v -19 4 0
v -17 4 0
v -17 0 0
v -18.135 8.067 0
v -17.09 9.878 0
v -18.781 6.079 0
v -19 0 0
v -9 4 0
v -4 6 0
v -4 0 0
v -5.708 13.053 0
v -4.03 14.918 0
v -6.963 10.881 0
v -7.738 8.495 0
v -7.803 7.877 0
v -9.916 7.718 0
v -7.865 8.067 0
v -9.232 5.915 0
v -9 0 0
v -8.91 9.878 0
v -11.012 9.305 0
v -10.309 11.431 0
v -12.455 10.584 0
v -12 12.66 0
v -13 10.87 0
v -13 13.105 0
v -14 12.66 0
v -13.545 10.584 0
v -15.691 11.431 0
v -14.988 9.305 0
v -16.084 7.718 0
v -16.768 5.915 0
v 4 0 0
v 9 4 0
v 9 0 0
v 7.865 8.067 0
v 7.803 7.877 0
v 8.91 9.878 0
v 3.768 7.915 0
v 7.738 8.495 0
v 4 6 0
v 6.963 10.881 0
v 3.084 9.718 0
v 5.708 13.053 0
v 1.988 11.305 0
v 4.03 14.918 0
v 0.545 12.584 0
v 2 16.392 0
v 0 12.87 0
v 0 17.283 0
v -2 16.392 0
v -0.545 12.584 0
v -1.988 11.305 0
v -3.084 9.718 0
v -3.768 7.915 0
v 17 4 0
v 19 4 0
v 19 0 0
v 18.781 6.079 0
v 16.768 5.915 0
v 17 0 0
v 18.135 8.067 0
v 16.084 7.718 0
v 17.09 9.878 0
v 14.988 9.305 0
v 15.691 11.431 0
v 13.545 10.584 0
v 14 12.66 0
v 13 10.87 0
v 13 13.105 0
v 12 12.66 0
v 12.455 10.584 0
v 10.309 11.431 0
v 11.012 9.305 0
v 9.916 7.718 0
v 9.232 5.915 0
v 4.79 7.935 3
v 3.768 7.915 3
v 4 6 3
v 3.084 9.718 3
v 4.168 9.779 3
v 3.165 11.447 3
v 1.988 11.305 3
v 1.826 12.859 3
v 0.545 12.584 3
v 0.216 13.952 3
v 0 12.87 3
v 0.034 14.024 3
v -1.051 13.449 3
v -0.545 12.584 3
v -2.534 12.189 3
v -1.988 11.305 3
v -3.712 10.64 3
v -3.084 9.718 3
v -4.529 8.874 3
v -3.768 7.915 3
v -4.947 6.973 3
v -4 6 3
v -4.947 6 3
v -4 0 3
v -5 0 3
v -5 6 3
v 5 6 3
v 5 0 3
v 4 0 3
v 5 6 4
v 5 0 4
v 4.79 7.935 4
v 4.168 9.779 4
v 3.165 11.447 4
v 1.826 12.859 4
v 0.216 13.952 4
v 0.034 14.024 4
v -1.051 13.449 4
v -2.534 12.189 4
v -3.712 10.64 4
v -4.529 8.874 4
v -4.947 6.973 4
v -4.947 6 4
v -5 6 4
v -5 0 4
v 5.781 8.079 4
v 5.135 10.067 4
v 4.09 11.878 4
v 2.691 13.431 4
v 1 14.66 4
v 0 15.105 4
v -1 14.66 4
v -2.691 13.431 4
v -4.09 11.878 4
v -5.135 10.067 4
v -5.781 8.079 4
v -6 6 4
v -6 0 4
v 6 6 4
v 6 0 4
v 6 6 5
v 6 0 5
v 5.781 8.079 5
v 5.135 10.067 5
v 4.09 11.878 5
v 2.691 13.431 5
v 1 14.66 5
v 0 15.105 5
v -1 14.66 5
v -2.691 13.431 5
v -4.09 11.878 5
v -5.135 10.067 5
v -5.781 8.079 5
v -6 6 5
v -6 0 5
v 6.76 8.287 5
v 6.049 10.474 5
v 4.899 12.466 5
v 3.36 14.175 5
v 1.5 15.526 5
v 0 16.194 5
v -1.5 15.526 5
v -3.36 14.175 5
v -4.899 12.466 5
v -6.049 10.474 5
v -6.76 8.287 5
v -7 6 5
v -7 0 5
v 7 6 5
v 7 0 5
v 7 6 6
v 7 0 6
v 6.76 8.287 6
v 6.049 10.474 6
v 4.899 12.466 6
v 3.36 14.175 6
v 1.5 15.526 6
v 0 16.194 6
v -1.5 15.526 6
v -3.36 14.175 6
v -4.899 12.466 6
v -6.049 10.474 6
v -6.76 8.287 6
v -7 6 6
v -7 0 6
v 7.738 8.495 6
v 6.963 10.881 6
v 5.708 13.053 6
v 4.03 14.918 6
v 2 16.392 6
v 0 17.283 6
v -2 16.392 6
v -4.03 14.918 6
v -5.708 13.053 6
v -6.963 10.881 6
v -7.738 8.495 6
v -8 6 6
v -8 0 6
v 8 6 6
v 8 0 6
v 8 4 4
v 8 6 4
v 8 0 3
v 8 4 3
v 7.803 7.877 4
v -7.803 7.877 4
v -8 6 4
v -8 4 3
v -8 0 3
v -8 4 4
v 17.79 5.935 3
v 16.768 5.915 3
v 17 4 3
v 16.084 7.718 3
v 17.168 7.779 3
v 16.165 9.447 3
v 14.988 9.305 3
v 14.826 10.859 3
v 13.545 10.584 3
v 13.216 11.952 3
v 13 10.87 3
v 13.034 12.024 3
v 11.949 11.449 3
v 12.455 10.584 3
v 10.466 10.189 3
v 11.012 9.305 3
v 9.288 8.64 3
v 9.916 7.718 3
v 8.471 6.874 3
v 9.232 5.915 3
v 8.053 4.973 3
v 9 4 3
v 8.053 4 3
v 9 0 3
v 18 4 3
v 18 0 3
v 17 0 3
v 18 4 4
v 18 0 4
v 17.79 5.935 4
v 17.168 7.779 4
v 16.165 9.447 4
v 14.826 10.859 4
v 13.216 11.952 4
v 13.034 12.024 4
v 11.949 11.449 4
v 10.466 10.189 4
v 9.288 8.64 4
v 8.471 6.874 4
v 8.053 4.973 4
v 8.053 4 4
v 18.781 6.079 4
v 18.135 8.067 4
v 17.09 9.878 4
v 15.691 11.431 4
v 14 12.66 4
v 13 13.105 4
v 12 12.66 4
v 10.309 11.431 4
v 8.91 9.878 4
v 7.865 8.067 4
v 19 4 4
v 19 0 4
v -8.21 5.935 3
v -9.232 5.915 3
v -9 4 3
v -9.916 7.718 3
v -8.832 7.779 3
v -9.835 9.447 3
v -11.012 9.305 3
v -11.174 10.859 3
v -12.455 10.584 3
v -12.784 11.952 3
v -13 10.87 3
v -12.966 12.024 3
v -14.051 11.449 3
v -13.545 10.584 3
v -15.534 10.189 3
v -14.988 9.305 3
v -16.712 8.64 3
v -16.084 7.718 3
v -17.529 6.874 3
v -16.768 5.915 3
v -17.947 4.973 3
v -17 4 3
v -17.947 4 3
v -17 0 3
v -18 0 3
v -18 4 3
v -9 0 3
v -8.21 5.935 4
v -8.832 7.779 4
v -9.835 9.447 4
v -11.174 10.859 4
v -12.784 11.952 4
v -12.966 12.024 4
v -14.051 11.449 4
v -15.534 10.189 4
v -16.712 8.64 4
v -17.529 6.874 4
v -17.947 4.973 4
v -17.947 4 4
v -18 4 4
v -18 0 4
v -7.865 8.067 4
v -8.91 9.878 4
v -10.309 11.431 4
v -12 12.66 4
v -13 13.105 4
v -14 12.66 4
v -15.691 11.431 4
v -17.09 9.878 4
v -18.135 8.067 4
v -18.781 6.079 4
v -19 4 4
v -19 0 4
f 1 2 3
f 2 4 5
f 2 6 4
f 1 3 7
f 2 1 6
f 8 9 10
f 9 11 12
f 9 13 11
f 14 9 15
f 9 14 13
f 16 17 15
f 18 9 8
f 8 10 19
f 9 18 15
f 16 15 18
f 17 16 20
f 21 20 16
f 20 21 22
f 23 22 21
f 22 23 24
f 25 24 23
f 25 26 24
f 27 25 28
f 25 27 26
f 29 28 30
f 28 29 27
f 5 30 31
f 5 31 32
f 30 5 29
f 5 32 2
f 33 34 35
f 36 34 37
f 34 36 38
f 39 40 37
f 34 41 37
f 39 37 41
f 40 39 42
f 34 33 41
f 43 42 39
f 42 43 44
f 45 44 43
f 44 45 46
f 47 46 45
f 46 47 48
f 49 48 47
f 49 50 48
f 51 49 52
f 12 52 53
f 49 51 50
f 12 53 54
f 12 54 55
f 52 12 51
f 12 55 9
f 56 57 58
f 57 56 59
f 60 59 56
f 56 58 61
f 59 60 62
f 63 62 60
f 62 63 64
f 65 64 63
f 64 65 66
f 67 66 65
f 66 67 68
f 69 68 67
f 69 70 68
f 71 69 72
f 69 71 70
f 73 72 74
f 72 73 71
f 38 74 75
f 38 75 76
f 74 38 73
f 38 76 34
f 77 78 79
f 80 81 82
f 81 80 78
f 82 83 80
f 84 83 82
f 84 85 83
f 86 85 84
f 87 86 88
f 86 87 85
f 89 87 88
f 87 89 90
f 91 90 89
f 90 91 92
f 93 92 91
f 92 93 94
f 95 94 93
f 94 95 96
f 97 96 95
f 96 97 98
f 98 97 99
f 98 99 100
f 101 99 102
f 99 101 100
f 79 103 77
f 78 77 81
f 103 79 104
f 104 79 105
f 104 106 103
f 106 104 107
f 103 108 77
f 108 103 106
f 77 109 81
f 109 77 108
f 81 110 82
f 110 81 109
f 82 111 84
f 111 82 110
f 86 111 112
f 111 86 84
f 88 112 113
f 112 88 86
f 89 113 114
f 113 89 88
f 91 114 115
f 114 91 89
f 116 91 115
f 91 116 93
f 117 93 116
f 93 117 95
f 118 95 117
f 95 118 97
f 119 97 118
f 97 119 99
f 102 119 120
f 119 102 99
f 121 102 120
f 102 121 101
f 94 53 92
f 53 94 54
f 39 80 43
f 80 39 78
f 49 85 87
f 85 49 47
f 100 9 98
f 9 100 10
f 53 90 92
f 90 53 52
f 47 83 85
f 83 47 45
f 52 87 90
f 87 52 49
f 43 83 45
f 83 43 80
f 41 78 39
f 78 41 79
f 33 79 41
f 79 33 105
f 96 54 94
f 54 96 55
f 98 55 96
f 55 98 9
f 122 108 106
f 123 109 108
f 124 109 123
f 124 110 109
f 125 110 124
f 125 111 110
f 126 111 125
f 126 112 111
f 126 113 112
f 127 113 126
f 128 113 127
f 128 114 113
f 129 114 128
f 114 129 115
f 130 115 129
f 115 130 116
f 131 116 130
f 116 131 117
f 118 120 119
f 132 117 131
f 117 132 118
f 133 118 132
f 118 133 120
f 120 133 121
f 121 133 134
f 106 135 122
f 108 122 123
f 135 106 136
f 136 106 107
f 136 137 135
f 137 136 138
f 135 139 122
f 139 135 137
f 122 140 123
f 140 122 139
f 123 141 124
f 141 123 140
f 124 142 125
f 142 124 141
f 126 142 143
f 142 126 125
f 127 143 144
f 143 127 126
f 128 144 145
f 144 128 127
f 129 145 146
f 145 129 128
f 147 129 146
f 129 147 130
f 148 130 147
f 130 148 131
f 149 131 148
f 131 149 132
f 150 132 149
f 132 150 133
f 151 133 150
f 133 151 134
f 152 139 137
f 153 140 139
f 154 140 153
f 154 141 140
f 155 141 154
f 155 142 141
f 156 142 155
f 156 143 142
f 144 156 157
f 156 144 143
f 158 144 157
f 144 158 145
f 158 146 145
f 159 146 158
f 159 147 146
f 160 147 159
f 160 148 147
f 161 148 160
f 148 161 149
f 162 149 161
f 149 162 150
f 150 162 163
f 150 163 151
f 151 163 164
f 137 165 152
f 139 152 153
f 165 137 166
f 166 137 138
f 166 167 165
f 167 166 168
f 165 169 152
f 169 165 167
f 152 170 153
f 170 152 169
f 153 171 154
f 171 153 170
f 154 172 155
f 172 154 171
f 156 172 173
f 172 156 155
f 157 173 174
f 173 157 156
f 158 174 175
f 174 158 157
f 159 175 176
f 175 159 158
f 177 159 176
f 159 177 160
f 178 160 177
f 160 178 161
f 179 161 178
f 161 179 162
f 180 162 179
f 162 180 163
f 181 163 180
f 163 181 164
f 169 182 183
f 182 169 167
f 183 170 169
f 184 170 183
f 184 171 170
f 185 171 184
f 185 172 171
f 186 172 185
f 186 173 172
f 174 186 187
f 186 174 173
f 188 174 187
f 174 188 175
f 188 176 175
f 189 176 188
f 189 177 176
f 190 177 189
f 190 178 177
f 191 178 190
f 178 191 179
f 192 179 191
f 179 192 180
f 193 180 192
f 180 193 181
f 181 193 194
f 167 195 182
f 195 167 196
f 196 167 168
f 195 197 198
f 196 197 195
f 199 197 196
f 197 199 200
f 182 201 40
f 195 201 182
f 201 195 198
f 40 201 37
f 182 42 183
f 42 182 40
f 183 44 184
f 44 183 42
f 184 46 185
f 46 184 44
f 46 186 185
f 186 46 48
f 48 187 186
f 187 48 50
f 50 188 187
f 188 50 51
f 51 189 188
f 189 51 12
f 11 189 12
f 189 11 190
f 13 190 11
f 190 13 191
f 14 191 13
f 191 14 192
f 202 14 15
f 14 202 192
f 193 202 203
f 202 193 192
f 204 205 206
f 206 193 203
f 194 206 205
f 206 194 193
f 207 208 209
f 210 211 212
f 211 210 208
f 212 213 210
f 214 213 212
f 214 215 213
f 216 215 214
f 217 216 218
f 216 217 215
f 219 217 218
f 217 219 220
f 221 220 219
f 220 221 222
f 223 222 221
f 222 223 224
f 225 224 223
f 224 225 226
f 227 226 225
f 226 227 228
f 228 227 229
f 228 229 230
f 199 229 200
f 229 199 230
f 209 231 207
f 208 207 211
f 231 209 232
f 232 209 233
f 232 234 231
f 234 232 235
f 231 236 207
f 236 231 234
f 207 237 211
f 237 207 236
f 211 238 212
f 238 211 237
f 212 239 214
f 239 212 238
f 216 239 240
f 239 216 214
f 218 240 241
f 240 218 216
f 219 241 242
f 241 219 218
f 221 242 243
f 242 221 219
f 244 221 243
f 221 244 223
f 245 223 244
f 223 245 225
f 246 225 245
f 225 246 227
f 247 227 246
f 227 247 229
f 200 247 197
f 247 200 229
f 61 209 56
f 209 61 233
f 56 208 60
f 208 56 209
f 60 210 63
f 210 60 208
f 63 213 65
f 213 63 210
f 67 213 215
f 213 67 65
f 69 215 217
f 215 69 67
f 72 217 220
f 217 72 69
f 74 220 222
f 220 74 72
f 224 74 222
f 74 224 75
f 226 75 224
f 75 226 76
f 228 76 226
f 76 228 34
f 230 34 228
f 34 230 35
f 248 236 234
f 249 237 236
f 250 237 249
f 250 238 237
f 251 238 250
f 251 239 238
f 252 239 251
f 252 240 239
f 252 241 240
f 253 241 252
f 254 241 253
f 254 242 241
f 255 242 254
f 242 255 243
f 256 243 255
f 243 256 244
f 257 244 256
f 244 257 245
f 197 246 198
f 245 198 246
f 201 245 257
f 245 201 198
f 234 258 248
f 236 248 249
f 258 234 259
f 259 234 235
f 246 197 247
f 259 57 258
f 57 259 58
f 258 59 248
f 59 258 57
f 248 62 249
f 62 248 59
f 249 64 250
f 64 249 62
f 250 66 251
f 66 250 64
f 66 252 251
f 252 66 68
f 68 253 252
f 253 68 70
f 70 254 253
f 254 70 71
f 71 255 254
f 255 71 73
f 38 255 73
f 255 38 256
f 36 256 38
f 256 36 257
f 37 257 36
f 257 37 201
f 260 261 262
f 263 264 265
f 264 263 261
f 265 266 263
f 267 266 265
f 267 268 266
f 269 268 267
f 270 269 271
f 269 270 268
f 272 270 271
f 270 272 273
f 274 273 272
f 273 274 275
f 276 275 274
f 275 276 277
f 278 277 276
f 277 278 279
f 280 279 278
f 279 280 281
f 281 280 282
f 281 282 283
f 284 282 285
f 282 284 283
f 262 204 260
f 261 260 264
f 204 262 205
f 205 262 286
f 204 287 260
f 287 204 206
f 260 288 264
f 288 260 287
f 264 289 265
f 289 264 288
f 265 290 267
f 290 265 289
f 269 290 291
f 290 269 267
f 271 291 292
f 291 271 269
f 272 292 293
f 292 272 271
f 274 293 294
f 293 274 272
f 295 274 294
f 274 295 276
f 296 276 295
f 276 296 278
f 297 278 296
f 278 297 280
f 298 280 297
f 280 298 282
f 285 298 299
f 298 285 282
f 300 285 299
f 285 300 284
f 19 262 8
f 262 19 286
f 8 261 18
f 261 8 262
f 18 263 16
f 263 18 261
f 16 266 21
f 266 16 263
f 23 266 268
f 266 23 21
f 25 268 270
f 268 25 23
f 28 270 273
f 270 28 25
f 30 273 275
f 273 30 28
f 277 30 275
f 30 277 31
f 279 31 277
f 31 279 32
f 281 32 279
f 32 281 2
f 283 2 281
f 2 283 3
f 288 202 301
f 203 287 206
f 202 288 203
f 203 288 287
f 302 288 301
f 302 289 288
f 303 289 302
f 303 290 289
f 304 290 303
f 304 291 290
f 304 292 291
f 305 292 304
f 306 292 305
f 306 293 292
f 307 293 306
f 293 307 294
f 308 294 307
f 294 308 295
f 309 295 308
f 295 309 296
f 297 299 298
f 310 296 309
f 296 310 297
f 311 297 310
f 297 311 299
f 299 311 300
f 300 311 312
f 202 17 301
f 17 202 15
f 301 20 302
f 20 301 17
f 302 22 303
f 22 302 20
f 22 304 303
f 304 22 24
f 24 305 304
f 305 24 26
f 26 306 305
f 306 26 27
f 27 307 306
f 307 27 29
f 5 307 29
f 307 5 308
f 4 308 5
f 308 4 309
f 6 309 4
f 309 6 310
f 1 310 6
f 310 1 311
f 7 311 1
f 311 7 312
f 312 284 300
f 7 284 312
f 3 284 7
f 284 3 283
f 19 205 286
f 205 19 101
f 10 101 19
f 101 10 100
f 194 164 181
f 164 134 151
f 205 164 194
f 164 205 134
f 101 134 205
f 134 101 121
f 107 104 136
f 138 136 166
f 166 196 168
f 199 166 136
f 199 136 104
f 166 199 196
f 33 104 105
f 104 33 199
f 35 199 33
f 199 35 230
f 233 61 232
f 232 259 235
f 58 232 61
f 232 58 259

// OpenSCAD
module s (x,y,r) {
   union() {
    intersection () {
        translate([x,y,0]) circle(r);
        translate([-x,y,0]) circle(r);
    }
    translate([0,y/2,0]) square(size=[2 *(r-x), y],center=true);
 }
}

module door(x,y,r,d) {
      linear_extrude(height=d) s(x,y,r);
};

module arch(x,y,r,d,t) {
  translate([0,-1,0]) 
      difference () {
         door(x,y,r+t,d);
         translate([0,0,-1]) door(x,y,r,d+2*t + 2);
  }
}

module archway (x,y,r,d,t,n) {
  union() {
     for (i=[0:n-1]) {
       arch(x,y,r+i*t,d+i*t,t);
    }
  }
}

module triple_arch(x,y,r,d,t,n,dy,dn) {
  assign(offset = r + x + (n + dn -1) * t) {
  echo(offset);
  union() {
    archway(x,y,r,d,t,n);
    translate([offset,0,0])    archway(x,y+dy,r,d,t,n+dn);
    translate([-offset,0,0])   archway(x,y+dy,r,d,t,n+dn);
  }
  }
} 

difference() {
   triple_arch(4,7,8,3,1,4,-2,-2);
   translate([0,-10,-2]) cube([100,20,100],center=true);
}
